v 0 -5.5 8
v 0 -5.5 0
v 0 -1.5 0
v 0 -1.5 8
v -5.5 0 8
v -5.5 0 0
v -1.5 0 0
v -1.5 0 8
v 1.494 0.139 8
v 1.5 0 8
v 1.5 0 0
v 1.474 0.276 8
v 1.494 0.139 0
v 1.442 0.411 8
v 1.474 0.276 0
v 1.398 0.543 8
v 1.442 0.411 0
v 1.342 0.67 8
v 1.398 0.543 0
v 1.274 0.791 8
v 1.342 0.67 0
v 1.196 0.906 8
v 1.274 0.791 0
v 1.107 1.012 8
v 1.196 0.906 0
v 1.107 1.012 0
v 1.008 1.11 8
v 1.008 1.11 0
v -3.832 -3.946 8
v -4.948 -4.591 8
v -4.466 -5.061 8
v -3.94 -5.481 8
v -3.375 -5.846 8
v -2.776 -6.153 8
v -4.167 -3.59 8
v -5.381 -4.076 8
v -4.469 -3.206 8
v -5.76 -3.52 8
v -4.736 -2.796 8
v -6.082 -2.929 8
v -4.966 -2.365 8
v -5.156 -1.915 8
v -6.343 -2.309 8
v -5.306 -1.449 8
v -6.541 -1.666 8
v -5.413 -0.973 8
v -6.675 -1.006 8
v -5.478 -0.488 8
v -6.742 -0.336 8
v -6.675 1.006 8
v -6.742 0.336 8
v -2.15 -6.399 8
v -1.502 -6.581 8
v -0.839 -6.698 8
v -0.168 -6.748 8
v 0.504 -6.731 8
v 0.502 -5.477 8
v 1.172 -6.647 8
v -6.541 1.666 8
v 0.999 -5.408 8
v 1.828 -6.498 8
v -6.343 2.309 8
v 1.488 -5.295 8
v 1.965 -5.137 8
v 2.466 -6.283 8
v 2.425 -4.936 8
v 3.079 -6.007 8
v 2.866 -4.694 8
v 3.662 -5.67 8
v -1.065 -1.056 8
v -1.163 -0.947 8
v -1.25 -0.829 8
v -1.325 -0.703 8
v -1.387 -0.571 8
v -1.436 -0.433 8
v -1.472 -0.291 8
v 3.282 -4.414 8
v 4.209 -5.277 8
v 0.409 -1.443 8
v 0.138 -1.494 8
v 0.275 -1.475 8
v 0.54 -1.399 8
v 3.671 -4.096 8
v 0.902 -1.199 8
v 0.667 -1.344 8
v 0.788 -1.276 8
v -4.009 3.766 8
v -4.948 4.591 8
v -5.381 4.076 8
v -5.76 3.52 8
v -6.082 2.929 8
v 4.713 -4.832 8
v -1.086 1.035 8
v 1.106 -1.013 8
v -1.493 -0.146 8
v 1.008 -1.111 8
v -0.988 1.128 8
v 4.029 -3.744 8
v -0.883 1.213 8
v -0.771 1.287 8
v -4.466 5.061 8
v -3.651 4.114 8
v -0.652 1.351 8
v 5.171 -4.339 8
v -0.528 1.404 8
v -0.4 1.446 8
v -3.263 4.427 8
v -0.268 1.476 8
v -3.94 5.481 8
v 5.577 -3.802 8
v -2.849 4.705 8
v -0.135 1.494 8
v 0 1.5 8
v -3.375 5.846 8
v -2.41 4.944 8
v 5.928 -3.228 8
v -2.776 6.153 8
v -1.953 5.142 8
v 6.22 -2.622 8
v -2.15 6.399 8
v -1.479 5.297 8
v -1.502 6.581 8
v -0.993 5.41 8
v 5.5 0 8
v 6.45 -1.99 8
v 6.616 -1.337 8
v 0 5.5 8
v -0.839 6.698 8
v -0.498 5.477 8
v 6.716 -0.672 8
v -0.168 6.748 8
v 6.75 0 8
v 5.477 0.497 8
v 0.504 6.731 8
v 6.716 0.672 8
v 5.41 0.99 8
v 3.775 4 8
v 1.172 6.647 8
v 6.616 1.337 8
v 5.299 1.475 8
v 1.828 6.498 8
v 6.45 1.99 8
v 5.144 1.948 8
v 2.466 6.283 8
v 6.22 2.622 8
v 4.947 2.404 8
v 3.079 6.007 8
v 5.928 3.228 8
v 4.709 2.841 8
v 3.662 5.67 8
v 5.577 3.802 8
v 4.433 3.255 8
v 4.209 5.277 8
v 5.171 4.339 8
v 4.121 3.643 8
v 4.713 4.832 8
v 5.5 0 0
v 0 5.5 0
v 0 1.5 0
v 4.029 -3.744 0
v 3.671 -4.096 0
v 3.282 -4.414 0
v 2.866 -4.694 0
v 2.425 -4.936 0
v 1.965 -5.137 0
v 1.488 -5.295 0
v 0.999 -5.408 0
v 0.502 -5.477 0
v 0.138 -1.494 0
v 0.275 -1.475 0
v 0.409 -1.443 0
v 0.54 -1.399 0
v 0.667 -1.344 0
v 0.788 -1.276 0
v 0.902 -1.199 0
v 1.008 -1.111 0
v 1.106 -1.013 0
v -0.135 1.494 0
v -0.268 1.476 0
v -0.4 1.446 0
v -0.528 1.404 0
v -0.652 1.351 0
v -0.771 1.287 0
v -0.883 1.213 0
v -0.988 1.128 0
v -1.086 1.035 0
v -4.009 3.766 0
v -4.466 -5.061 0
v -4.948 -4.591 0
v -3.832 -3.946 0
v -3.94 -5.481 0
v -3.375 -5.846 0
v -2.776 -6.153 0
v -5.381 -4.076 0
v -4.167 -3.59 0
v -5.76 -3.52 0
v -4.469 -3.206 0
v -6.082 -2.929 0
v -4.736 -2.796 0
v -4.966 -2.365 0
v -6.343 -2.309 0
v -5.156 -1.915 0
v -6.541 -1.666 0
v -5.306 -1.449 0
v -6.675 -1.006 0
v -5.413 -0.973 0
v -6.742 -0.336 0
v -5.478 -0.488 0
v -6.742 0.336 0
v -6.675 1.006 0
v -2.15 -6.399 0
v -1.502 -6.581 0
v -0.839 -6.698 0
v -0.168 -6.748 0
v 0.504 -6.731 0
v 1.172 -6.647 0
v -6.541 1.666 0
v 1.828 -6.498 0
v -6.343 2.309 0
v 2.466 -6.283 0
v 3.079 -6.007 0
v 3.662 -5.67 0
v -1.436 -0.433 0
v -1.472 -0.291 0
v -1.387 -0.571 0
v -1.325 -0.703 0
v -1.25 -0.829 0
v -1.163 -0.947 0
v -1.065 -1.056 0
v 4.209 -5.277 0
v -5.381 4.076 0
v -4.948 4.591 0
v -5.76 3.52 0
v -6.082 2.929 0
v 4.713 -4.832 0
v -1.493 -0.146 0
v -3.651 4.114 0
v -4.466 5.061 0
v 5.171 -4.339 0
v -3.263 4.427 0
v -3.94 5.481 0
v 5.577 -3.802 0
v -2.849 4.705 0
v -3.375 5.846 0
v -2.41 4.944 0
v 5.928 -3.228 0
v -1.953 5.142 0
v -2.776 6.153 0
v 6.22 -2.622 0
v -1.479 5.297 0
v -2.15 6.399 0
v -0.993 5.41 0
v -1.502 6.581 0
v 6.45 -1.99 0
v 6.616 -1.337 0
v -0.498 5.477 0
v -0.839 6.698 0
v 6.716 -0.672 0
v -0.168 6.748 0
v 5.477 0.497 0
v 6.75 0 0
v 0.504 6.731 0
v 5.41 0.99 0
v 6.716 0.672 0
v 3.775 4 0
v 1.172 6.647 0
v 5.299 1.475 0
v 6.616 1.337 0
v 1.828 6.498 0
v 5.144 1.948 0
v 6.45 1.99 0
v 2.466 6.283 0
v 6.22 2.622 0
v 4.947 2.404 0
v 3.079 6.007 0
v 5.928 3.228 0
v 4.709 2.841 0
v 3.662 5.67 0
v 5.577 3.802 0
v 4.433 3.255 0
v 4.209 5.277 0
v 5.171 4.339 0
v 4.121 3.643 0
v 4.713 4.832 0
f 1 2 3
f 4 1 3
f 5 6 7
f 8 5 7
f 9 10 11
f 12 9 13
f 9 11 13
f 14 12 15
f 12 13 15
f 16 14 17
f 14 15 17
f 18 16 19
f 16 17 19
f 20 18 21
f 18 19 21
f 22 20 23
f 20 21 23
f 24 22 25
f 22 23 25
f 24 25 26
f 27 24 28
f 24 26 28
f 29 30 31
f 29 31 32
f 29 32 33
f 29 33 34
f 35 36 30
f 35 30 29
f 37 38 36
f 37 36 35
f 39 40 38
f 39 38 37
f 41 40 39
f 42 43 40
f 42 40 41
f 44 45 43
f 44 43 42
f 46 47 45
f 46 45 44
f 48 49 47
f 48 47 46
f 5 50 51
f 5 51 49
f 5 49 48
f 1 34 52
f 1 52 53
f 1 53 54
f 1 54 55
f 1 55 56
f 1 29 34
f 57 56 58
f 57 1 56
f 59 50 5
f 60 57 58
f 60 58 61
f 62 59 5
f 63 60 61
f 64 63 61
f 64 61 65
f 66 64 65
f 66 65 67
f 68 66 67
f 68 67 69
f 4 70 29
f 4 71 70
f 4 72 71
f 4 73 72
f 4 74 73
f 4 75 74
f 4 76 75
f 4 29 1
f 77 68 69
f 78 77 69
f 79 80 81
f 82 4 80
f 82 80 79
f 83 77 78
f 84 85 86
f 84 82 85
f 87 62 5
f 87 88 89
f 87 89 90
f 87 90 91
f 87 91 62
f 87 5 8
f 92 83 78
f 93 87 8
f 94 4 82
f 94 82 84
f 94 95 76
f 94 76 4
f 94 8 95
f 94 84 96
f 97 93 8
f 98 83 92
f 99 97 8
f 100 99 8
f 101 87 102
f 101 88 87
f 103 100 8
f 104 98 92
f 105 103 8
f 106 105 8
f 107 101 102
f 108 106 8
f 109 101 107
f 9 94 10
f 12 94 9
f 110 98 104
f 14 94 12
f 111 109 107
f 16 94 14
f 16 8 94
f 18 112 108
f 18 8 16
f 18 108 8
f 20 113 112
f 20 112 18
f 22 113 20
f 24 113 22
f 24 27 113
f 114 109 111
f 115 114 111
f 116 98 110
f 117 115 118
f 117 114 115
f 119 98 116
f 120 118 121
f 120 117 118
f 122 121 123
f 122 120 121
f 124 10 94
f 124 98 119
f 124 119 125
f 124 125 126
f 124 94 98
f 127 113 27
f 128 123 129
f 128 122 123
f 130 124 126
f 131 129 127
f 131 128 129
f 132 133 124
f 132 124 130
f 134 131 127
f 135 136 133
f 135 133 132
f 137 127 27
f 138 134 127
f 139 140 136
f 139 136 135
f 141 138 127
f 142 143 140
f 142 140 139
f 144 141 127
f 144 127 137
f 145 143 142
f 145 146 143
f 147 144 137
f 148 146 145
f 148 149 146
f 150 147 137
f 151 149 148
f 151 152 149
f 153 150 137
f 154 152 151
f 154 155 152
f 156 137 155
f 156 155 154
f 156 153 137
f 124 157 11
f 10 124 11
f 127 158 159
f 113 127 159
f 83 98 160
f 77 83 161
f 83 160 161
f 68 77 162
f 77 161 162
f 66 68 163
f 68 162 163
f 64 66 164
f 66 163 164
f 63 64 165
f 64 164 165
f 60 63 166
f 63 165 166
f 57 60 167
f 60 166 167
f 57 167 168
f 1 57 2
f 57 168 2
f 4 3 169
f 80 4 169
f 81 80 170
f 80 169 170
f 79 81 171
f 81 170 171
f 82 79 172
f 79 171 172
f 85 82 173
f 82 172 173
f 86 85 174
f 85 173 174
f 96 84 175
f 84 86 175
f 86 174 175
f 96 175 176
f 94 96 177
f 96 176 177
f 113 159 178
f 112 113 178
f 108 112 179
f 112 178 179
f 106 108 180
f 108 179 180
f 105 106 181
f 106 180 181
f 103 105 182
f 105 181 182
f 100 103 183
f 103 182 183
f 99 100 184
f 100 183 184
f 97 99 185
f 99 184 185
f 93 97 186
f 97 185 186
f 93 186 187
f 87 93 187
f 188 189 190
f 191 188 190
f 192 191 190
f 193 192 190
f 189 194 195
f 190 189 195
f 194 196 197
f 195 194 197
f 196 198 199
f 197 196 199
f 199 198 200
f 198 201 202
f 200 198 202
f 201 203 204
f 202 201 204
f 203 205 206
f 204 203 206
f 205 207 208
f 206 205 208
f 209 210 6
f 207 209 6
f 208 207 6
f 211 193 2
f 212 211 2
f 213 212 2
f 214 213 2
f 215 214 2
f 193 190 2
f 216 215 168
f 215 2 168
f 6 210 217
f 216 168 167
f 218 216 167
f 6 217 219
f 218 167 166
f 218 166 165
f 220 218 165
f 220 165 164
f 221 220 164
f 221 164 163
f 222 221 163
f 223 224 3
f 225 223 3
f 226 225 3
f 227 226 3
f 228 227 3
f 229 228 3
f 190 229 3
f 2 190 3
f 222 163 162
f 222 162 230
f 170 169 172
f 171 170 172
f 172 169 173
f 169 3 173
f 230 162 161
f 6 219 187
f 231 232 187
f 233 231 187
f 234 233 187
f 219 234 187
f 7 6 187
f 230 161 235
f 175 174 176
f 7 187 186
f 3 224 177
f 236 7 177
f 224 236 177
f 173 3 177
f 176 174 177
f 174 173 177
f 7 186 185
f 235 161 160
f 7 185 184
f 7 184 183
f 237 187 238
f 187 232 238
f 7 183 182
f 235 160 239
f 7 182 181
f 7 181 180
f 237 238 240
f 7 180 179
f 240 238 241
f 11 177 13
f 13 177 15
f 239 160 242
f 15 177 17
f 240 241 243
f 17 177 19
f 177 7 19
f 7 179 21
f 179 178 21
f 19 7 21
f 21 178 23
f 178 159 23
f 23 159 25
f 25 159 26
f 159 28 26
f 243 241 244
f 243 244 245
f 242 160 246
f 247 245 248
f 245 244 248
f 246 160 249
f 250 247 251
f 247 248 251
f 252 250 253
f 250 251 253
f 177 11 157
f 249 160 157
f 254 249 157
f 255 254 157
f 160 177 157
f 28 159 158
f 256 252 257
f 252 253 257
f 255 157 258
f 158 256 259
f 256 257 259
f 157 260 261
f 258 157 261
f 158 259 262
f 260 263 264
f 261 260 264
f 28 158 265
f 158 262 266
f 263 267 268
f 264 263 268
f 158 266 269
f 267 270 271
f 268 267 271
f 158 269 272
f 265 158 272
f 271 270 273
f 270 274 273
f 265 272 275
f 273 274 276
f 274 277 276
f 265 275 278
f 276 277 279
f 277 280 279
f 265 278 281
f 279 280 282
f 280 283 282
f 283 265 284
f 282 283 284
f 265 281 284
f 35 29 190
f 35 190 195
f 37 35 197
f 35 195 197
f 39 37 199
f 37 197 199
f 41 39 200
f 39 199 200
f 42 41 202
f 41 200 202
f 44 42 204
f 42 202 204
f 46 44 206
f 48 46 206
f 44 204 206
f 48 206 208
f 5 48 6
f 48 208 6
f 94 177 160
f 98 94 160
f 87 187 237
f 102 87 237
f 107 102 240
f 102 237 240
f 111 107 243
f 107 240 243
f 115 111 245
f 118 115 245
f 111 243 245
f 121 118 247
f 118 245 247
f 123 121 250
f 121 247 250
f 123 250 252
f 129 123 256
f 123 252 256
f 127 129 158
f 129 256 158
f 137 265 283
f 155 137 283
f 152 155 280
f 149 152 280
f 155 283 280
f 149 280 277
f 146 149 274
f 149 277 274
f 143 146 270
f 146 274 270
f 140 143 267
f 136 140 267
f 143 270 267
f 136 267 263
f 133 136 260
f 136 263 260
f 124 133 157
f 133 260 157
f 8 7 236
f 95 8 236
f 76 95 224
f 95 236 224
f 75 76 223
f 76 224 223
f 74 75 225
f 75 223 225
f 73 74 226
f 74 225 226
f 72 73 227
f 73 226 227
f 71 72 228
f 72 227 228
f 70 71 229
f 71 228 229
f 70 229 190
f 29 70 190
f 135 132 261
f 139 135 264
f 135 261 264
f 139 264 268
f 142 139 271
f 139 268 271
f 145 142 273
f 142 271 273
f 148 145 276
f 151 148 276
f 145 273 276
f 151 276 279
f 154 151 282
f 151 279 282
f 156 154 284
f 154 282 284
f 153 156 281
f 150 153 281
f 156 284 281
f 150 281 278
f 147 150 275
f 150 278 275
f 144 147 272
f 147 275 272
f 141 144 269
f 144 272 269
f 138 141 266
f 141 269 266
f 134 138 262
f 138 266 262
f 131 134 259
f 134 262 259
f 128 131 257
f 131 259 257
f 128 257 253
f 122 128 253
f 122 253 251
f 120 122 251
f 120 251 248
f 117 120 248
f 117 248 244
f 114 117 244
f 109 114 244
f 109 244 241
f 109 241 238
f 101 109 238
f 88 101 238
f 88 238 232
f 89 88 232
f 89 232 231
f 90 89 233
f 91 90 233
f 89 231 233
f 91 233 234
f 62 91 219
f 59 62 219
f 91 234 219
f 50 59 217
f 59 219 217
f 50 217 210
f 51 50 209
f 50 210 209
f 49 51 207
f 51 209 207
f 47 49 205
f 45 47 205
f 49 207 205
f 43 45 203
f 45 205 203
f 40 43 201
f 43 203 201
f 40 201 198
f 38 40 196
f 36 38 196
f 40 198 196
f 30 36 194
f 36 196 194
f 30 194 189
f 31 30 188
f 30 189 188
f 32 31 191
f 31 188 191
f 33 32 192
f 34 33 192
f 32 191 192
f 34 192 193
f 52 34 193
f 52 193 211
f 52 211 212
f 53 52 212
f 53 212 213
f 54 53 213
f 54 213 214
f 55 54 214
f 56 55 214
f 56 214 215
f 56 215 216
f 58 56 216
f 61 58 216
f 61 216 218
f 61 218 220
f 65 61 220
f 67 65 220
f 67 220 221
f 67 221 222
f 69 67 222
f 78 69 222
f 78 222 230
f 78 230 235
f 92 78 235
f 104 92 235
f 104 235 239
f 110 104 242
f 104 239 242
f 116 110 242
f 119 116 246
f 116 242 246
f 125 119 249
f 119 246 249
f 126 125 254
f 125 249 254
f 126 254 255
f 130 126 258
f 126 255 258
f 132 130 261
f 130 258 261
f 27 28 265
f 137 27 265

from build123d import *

# Parameters (mm, degrees)
F0_R     = 6.75
F1_DEPTH = 8
F3_DEPTH = 8.001


with BuildPart() as f1:
    # F0 (on Top) → F1 (new body)
    with BuildSketch(Plane.XY):
        Circle(F0_R)
    extrude(amount=F1_DEPTH)

    # F2 (on face) → F3 (cut, through all)
    with BuildSketch(Plane(origin=(0, 0, 0), x_dir=(1, 0, 0), z_dir=(0, 0, -1))):
        with BuildLine():
            Line((1.106261084, 1.0130085952), (4.0290932015, 3.7438493524))
            ThreePointArc((4.0290932015, 3.7438493524), (2.1975928378, 5.0418831521), (0, 5.5))
            Line((0, 5.5), (0, 1.5))
            ThreePointArc((0, 1.5), (0.6043538315, 1.3728643219), (1.106261084, 1.0130085952))
        make_face()
        with BuildLine():
            Line((-1.0654173052, 1.055881606), (-3.8317758444, 3.9455663571))
            ThreePointArc((-3.8317758444, 3.9455663571), (-5.0658053231, 2.1418721783), (-5.5, 0))
            Line((-5.5, 0), (-1.5, 0))
            ThreePointArc((-1.5, 0), (-1.3871059725, 0.5709089429), (-1.0654173052, 1.055881606))
        make_face()
        with BuildLine():
            ThreePointArc((-4.0085548388, -3.7658316617), (-2.1837955331, -5.0478745101), (0, -5.5))
            Line((0, -5.5), (0, -1.5))
            ThreePointArc((0, -1.5), (-0.5905563661, -1.3788557497), (-1.0857227213, -1.0349909046))
            Line((-1.0857227213, -1.0349909046), (-4.0085548388, -3.7658316617))
        make_face()
        with BuildLine():
            ThreePointArc((3.7747972956, -4.0001131705), (5.0503160855, -2.1781431167), (5.5, 0))
            Line((5.5, 0), (1.5, 0))
            ThreePointArc((1.5, 0), (1.3716154954, -0.6071827836), (1.0084387564, -1.1104284194))
            Line((1.0084387564, -1.1104284194), (3.7747972956, -4.0001131705))
        make_face()
    extrude(amount=-F3_DEPTH, mode=Mode.SUBTRACT)


solid = f1.part
